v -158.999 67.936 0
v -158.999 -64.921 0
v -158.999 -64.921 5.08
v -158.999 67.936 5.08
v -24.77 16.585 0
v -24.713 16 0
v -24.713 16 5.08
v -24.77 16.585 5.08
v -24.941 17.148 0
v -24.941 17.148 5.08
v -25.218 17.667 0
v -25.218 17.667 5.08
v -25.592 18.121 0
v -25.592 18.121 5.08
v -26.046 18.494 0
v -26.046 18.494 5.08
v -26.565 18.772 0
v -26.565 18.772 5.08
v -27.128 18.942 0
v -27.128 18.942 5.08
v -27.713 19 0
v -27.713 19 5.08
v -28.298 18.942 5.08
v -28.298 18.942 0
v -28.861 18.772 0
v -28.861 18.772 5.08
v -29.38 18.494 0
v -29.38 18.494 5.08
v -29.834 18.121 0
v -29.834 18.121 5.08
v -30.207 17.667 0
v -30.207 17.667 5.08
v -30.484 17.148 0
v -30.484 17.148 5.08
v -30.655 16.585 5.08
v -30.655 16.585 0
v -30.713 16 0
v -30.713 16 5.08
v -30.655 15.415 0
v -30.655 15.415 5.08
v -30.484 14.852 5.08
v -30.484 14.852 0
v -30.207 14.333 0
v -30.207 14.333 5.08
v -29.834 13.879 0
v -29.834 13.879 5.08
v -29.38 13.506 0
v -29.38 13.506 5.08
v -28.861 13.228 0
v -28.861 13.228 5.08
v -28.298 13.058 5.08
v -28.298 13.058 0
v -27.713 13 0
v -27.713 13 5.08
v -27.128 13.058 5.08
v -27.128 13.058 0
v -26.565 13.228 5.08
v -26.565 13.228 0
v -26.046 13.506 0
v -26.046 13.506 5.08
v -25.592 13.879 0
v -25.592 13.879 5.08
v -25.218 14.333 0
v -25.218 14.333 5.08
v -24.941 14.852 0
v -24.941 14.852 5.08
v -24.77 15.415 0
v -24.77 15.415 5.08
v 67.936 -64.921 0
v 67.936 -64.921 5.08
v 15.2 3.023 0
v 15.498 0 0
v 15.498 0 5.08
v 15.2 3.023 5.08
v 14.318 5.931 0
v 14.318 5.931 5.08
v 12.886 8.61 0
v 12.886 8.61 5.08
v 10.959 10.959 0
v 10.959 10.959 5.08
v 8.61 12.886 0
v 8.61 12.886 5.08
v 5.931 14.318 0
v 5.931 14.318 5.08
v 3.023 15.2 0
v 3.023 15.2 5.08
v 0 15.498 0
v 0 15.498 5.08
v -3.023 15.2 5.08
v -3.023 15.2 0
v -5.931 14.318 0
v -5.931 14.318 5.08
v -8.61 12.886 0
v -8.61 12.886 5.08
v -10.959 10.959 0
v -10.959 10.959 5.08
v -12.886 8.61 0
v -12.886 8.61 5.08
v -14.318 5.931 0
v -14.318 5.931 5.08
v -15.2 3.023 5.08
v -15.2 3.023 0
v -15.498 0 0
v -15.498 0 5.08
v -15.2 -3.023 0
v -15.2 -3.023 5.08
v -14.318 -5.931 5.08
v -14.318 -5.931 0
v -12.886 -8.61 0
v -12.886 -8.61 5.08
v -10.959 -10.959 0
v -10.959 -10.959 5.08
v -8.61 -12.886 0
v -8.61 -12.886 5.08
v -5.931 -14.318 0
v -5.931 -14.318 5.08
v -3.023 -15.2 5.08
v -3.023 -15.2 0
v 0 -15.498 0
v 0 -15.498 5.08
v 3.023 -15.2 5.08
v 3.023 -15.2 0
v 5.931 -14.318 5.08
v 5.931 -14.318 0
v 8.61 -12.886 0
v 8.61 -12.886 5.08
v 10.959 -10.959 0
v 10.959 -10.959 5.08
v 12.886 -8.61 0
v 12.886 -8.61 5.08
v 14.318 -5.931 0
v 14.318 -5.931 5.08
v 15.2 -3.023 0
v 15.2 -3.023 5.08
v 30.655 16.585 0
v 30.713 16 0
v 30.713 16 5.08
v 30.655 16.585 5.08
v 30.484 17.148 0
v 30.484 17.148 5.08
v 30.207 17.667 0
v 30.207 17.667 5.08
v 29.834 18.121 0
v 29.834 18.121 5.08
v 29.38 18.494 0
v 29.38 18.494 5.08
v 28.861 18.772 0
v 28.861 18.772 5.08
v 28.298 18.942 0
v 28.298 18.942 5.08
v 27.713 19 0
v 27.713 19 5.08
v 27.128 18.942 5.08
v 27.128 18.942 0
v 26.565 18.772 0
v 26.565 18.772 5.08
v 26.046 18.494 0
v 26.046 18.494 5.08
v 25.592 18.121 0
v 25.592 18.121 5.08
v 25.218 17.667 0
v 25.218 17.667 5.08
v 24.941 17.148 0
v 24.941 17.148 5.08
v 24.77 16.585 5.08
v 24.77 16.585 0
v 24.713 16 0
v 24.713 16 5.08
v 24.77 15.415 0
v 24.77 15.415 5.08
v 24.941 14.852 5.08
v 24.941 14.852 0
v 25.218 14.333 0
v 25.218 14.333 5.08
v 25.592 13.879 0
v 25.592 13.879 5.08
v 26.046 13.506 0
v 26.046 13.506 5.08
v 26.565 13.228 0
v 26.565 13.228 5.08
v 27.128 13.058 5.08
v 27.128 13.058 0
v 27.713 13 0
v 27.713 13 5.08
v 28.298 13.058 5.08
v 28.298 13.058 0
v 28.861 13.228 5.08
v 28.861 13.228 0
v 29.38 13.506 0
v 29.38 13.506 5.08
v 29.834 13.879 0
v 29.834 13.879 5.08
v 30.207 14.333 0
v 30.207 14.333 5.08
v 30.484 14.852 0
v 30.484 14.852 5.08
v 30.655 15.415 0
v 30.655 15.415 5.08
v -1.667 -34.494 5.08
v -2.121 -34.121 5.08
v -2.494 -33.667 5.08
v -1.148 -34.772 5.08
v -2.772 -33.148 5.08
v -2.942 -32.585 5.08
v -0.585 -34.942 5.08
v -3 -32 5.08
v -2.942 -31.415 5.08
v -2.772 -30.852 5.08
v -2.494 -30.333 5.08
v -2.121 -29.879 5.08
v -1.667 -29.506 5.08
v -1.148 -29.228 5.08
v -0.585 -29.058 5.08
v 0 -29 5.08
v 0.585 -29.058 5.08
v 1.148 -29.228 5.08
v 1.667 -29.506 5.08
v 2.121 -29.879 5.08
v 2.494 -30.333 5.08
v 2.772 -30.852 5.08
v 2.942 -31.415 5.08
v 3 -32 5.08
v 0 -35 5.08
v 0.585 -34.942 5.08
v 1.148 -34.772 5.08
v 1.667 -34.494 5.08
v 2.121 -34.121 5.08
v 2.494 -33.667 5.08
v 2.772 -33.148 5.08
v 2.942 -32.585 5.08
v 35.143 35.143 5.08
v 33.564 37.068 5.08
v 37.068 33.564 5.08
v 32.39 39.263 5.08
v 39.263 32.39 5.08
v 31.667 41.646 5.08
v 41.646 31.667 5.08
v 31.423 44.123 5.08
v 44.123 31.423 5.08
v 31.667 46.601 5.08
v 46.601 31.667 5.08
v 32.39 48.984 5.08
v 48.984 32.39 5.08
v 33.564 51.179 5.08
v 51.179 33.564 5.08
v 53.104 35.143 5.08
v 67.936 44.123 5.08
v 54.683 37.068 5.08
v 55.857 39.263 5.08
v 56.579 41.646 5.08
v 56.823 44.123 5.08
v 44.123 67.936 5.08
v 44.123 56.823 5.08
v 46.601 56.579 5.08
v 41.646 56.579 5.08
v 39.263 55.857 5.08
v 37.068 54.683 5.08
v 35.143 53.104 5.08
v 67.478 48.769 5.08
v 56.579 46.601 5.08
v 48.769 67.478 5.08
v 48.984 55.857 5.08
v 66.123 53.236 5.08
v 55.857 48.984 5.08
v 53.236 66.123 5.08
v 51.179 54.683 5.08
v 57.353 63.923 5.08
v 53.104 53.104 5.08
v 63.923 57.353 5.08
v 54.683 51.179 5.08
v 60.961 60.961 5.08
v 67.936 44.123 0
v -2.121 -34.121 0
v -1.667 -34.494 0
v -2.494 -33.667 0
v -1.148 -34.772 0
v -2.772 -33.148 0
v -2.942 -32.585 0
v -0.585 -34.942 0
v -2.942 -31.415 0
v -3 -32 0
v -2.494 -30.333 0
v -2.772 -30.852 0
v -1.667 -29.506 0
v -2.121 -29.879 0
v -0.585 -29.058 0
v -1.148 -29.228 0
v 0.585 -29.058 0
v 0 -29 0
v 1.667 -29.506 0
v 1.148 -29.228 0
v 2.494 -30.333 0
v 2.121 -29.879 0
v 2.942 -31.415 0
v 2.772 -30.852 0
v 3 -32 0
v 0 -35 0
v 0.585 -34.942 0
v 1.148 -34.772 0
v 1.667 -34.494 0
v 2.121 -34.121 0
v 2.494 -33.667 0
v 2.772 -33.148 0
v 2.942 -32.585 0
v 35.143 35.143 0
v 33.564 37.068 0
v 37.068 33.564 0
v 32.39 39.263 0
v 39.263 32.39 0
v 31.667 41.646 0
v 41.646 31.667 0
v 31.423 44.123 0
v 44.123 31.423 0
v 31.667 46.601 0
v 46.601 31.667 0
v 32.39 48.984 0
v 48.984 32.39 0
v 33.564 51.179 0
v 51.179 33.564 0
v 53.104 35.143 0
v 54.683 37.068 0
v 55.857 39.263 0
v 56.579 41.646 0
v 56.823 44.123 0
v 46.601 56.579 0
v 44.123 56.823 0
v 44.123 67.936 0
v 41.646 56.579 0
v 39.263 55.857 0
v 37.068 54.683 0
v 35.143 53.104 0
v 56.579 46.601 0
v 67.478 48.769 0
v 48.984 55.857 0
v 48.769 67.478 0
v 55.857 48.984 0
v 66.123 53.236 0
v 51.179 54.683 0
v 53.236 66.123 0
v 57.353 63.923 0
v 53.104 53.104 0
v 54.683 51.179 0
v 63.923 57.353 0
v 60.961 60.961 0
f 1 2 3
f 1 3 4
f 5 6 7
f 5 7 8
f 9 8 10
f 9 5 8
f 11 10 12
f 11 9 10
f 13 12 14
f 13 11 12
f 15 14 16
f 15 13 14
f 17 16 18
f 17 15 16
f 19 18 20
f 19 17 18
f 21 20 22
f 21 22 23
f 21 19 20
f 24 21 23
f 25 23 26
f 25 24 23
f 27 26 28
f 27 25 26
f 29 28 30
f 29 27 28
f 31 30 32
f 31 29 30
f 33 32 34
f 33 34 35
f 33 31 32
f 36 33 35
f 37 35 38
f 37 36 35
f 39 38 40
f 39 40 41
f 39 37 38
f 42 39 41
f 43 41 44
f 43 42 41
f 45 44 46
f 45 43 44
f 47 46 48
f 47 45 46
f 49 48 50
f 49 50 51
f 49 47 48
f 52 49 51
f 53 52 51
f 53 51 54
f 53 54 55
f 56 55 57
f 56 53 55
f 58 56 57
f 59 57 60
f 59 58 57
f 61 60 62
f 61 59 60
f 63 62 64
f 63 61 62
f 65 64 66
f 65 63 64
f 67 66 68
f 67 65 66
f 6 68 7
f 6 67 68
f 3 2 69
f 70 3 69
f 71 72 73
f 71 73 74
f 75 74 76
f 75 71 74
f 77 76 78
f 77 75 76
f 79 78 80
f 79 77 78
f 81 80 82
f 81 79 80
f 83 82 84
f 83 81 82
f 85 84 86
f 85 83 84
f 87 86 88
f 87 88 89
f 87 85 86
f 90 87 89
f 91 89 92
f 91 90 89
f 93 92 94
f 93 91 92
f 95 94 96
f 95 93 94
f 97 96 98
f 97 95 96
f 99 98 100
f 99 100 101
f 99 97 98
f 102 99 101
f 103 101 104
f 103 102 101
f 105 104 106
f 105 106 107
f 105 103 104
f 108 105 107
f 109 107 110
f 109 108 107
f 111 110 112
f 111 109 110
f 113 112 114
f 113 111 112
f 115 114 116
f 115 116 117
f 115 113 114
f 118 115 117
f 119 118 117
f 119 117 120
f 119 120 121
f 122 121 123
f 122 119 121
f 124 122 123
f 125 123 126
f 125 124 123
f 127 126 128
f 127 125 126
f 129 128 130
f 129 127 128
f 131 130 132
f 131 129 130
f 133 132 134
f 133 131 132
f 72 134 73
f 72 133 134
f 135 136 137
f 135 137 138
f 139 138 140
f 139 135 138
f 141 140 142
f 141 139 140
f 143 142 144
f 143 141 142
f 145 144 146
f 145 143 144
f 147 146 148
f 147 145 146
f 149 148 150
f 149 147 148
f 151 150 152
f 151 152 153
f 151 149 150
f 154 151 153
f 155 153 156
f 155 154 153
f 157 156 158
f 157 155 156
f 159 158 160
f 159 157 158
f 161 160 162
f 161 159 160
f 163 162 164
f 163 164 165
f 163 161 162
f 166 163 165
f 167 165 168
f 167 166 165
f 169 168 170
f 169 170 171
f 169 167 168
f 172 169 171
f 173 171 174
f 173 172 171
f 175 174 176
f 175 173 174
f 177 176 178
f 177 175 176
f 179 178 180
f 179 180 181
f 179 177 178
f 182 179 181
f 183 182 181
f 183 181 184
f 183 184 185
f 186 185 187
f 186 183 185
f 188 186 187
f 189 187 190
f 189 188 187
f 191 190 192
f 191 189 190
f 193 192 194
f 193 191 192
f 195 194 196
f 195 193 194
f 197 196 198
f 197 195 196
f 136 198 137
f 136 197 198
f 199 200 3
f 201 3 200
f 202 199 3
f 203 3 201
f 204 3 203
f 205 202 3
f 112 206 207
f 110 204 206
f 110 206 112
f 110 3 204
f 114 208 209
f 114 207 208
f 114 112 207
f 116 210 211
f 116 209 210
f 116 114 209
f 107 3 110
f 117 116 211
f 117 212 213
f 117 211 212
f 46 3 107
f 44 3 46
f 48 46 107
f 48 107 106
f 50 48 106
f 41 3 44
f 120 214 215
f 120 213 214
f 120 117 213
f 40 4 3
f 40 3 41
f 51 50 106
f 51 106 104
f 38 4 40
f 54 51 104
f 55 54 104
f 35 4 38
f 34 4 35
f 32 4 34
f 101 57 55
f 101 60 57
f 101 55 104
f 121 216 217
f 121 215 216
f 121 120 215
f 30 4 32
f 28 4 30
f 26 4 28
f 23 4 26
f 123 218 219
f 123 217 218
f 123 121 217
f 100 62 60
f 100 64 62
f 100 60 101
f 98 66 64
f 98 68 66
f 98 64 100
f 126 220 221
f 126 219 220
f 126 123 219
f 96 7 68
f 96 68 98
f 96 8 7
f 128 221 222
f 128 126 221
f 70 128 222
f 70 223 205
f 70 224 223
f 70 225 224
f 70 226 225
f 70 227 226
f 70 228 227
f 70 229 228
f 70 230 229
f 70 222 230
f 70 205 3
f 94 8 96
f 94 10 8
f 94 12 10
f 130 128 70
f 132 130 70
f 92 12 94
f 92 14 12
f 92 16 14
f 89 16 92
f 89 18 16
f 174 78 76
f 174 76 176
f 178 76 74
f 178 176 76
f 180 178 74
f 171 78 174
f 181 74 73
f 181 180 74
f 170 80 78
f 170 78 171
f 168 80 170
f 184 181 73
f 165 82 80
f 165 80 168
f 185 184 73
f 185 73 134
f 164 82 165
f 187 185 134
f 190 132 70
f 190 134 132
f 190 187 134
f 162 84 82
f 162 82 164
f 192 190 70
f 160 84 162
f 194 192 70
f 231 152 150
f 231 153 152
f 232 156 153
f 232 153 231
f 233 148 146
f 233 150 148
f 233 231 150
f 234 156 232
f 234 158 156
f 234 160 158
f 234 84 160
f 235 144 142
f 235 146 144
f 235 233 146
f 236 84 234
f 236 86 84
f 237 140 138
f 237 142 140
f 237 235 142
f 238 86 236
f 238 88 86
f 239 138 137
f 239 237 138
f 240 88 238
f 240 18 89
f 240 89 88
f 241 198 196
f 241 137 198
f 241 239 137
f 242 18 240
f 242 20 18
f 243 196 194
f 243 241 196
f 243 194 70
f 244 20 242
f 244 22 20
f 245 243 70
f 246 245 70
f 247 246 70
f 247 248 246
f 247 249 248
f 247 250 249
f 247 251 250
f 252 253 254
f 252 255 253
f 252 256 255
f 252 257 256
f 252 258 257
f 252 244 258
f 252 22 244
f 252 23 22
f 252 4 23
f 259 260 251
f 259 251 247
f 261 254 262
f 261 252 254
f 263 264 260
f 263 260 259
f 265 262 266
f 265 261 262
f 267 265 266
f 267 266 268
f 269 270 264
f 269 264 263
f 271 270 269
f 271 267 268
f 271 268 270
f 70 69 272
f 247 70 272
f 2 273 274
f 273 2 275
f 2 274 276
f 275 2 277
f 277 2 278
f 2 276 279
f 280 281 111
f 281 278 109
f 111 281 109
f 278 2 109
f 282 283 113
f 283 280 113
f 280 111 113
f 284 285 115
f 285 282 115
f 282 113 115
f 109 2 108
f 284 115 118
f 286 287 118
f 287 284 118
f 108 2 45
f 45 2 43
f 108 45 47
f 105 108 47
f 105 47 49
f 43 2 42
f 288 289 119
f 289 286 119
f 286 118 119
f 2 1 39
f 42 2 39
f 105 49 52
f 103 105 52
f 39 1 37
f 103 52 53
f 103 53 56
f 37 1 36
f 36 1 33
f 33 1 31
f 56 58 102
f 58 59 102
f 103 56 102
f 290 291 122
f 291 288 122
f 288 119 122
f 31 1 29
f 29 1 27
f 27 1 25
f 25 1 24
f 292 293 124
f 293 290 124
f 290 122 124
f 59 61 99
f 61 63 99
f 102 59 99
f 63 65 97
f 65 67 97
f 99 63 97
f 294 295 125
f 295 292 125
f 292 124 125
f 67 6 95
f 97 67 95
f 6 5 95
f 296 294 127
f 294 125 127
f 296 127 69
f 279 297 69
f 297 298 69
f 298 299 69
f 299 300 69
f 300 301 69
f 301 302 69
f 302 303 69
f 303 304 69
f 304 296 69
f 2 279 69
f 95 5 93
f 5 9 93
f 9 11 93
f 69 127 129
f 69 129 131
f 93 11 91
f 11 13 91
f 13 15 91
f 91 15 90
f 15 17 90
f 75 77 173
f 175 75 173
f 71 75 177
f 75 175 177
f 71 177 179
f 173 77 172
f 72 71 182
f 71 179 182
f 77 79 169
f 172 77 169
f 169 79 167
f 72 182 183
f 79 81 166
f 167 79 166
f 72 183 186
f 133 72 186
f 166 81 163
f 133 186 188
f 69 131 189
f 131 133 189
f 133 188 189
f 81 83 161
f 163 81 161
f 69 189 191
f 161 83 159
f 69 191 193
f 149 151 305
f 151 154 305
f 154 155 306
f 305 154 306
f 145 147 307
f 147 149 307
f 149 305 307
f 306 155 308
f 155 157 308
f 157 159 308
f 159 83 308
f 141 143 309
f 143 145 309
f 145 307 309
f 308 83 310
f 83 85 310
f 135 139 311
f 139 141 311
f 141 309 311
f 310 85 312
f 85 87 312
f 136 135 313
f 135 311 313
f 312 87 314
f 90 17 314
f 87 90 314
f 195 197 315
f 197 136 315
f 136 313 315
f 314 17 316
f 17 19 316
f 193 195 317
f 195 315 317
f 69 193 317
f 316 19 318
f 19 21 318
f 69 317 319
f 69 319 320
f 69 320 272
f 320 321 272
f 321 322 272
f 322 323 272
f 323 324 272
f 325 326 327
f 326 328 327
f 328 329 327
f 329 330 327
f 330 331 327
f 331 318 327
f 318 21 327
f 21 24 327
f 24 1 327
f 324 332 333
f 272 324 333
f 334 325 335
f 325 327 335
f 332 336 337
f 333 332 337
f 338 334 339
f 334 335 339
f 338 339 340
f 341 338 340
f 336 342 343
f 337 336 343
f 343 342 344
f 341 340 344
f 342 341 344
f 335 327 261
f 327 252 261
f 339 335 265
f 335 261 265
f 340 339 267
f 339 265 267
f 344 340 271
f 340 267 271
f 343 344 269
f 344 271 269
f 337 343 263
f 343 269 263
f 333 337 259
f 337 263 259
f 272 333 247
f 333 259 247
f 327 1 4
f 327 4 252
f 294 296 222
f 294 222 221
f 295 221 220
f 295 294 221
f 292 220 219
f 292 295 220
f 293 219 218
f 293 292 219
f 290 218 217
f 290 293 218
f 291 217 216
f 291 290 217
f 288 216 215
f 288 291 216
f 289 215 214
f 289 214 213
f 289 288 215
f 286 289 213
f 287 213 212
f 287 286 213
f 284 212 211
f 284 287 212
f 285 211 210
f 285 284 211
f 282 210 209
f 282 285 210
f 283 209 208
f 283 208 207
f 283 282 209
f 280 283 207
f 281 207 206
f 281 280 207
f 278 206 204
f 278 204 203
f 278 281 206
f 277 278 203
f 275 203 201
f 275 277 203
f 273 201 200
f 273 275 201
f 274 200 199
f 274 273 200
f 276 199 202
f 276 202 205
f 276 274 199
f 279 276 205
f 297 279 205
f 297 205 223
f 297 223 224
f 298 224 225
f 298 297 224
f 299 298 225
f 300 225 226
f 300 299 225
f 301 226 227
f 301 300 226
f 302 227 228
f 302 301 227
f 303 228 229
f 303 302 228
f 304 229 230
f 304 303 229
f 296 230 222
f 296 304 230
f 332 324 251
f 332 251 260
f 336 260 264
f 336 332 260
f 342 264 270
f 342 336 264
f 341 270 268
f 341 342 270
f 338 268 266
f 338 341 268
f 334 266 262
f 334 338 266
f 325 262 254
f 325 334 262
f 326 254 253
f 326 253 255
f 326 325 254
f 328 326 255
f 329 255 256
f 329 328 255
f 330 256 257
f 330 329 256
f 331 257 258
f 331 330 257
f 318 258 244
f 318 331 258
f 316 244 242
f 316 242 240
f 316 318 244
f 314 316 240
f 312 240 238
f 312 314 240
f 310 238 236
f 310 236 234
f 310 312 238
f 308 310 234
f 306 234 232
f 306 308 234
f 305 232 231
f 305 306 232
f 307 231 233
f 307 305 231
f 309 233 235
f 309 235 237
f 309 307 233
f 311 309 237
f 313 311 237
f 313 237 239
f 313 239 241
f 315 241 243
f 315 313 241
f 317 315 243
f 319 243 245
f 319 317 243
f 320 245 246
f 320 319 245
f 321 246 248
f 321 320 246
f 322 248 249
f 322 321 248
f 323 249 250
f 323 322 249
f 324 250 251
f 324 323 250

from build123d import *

# Parameters (mm, degrees)
F0_W     = 226.934584
F0_H     = 132.857451
F0_R     = 3
F0_R_2   = 15.497899
F0_R_3   = 12.7
F1_DEPTH = 5.08
F2_R     = 23.8125


with BuildPart() as f1:
    # F0 (on Top) → F1 (new body)
    with BuildSketch(Plane.XY):
        with Locations((-45.531327, 1.507239)):
            Rectangle(F0_W, F0_H)
        with Locations((0, -32.000012)):
            Circle(F0_R, mode=Mode.SUBTRACT)
        Circle(F0_R_2, mode=Mode.SUBTRACT)
        with Locations((-27.712823, 16.000006)):
            Circle(F0_R, mode=Mode.SUBTRACT)
        with Locations((27.712823, 16.000006)):
            Circle(F0_R, mode=Mode.SUBTRACT)
        with Locations((44.123465, 44.123465)):
            Circle(F0_R_3, mode=Mode.SUBTRACT)
    extrude(amount=F1_DEPTH)

    # F2
    f2_edges = [f1.edges().sort_by_distance(p)[0] for p in [
        (67.935965, 67.935965, 2.54),
    ]]
    fillet(f2_edges, radius=F2_R)


solid = f1.part
